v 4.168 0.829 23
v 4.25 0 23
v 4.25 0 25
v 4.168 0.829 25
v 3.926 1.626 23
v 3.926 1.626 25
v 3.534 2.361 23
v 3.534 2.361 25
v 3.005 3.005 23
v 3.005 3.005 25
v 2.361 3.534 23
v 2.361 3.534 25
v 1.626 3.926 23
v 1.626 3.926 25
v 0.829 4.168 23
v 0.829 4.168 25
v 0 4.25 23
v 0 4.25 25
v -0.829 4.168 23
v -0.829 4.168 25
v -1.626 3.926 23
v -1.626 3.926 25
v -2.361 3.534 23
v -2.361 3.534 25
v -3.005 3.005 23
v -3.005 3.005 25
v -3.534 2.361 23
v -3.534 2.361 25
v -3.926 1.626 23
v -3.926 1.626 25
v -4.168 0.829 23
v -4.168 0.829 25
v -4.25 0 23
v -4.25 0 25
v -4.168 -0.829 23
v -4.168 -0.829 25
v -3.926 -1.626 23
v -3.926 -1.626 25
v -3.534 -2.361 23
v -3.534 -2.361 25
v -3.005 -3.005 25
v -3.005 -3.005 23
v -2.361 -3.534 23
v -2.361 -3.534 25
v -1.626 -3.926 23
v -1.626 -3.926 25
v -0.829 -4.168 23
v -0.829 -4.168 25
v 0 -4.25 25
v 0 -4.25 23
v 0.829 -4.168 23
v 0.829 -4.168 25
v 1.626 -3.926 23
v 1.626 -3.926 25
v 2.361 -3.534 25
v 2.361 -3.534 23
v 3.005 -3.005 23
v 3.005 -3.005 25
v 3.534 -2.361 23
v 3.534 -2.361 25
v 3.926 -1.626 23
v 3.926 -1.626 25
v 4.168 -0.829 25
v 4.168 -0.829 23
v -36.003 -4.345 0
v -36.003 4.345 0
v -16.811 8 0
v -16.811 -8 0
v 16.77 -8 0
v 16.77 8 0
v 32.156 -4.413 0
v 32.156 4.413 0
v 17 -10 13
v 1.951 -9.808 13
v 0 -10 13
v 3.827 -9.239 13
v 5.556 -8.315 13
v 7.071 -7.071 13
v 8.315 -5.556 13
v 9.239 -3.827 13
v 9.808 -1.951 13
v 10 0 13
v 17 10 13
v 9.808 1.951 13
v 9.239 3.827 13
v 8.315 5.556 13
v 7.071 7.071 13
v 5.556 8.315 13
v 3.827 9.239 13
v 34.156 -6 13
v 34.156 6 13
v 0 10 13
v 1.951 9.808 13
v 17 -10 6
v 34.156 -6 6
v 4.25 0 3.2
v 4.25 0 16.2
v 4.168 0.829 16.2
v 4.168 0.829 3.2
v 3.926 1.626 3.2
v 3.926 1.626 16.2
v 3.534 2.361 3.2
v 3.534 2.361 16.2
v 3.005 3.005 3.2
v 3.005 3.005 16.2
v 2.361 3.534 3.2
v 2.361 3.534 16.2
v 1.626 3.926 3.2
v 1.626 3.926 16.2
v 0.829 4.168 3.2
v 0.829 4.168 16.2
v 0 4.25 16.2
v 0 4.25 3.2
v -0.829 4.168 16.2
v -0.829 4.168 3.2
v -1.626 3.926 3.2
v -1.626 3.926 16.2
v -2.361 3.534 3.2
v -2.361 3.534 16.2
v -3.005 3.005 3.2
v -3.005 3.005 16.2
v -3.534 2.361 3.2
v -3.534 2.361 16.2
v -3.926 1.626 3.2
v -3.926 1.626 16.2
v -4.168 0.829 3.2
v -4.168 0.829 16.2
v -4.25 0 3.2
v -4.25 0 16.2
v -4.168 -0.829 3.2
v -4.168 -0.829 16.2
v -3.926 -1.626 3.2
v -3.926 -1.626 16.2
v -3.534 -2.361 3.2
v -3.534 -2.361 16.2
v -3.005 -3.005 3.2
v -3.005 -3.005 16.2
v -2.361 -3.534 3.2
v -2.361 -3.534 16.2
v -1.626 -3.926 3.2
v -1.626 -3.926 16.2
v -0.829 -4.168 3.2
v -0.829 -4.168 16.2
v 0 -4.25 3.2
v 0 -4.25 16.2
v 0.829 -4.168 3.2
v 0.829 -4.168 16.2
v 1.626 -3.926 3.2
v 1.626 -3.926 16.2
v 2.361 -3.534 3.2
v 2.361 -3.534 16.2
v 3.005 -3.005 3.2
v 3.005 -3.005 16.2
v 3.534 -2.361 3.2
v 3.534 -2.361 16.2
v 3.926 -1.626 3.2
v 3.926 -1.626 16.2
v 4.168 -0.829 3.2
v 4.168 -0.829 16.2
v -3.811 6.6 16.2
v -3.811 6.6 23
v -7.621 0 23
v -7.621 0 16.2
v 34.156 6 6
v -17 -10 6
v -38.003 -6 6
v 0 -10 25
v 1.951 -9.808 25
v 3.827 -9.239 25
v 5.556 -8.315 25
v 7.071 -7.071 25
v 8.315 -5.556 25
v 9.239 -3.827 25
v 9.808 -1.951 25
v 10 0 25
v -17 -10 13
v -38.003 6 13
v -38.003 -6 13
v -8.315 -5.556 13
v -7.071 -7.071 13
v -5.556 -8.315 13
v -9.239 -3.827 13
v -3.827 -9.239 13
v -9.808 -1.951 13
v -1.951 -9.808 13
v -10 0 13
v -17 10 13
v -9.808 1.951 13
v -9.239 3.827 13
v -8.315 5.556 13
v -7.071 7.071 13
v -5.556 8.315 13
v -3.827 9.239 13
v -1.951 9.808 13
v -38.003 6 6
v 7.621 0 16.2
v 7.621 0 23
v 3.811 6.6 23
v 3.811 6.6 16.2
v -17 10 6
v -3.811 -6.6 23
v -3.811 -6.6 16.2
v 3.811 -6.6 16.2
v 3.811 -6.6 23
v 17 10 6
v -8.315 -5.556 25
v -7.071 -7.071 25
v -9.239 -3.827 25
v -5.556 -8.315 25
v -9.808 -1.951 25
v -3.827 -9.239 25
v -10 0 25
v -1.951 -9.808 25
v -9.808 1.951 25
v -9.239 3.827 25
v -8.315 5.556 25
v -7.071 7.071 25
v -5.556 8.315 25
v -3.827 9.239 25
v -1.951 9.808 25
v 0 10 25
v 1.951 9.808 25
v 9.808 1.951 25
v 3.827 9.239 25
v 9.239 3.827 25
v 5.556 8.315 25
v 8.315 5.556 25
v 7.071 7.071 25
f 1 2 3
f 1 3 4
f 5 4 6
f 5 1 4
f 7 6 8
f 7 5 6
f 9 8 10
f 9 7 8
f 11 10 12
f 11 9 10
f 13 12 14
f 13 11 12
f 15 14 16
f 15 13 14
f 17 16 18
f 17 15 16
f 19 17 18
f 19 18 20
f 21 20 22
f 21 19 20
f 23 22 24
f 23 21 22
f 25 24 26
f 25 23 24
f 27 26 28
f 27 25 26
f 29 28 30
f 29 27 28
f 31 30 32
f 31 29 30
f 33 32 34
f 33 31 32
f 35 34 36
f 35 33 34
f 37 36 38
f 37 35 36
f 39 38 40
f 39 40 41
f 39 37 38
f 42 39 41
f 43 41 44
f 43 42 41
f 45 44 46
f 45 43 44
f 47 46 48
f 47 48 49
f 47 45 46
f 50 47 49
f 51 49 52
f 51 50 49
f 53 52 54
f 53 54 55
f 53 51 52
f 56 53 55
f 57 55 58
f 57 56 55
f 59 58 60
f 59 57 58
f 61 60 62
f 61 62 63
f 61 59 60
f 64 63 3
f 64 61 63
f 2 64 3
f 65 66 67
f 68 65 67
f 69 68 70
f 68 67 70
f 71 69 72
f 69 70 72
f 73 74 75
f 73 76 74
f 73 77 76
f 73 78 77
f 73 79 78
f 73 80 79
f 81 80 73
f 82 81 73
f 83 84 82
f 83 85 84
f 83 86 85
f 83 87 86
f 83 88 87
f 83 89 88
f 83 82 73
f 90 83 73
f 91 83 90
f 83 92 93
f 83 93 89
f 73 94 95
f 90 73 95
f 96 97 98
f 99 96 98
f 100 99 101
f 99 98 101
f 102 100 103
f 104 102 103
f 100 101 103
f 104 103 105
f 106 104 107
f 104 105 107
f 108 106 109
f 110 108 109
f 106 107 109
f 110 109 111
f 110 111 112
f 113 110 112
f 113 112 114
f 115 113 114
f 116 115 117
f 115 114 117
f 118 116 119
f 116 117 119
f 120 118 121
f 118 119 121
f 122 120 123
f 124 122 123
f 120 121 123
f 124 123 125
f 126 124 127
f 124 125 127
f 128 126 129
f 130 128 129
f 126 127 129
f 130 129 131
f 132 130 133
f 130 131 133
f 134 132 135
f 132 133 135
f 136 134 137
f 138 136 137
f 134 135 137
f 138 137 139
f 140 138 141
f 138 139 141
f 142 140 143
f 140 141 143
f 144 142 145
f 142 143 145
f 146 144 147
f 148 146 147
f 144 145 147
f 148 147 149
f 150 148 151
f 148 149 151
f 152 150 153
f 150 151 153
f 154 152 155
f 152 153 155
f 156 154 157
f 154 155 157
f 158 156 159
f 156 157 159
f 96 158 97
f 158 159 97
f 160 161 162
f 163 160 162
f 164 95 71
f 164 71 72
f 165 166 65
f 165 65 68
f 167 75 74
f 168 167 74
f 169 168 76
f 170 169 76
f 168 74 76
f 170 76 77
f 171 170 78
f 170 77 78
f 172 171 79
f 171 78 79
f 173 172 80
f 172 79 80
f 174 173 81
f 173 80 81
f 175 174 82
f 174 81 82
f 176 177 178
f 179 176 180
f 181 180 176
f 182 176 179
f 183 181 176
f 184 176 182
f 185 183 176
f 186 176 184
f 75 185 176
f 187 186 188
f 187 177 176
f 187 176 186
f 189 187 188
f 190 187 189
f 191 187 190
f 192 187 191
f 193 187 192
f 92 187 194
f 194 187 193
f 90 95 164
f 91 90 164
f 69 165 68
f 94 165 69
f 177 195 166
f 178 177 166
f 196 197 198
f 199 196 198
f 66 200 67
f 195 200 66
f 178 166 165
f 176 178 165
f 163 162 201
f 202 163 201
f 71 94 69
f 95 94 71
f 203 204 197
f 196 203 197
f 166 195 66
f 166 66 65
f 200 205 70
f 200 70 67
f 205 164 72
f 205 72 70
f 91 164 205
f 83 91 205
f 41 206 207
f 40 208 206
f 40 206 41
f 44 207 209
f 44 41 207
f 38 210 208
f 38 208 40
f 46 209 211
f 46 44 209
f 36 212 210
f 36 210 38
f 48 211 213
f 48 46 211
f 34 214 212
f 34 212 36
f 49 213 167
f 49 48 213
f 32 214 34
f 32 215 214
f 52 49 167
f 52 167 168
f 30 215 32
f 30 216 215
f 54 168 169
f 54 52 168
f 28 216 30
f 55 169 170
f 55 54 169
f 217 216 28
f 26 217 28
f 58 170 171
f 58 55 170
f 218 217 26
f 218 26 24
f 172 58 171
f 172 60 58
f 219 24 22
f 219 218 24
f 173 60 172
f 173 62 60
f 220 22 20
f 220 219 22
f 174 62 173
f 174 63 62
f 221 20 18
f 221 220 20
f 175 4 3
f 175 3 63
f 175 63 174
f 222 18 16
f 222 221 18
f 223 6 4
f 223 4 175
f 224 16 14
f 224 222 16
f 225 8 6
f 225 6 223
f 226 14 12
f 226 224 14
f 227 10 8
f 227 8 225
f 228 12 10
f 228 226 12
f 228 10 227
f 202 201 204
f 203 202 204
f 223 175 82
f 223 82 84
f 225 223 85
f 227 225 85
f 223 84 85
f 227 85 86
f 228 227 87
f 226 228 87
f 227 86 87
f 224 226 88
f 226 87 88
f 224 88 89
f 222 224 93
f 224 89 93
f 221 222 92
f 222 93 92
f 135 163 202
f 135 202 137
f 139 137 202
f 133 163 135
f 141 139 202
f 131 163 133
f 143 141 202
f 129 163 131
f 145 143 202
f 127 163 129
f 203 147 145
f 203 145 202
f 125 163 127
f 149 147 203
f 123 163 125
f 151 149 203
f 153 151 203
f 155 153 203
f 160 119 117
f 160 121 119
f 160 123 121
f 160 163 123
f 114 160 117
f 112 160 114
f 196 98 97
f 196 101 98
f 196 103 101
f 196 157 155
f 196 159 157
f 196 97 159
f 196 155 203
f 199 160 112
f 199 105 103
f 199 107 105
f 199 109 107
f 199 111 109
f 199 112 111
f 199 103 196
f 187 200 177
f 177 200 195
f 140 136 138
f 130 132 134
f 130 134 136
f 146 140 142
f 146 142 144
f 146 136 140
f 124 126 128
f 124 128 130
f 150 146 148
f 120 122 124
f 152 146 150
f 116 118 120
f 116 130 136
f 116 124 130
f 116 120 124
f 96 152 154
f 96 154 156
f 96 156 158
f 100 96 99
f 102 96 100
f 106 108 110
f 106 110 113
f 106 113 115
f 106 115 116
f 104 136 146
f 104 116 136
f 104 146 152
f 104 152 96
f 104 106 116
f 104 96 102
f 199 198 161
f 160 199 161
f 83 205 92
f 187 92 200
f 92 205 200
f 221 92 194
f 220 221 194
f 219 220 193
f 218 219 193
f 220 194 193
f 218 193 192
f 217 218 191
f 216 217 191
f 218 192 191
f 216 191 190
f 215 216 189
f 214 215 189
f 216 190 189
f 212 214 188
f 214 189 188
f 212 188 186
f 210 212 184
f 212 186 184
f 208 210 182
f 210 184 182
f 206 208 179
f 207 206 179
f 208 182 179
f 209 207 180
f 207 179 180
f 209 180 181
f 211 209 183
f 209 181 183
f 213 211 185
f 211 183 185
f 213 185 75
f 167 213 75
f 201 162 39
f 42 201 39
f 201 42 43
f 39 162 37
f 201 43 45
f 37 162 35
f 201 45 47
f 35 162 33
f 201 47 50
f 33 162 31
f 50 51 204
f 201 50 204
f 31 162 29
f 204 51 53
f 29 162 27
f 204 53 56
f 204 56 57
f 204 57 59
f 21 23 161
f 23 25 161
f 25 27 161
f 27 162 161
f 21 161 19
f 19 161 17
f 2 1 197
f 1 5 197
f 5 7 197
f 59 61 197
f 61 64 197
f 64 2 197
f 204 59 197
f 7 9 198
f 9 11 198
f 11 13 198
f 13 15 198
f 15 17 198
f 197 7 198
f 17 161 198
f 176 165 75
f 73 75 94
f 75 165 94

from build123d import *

# Parameters (mm, degrees)
F1_DEPTH  = 13
F3_DEPTH  = 12
F5_DEPTH  = 8.8
F6_R      = 4.25
F7_DEPTH  = 13
F9_R      = 10
F9_R_2    = 4.25
F10_DEPTH = 2
F11_SIZE2 = 6
F11_SIZE  = 2


with BuildPart() as f1:
    # F0 (on Top) → F1 (new body)
    with BuildSketch(Plane.XY):
        Polygon((-17, -10), (17, -10), (34.1558913715, -6), (34.1558913715, 6), (17, 10), (-17, 10), (-38.0029598341, 6), (-38.0029598341, -6), align=None)
    extrude(amount=F1_DEPTH)

    # F2 (on face) → F3 (join)
    with BuildSketch(Plane.XY.offset(13)):
        with BuildLine():
            ThreePointArc((0, -10), (7.0710678119, -7.0710678119), (10, 0))
            ThreePointArc((10, 0), (7.0710677987, 7.0710678251), (-3.73e-08, 10))
            ThreePointArc((-3.73e-08, 10), (-10, -1.87e-08), (0, -10))
        make_face()
    extrude(amount=F3_DEPTH)

    # F4 (on face) → F5 (cut)
    with BuildSketch(Plane.XY.offset(25)):
        Polygon((-3.8105117767, -6.6), (3.8105117767, -6.6), (7.6210235533, 0), (3.8105117767, 6.6), (-3.8105117767, 6.6), (-7.6210235533, 0), align=None)
    extrude(amount=-F5_DEPTH, mode=Mode.SUBTRACT)

    # F6 (on face) → F7 (cut)
    with BuildSketch(Plane.XY.offset(16.2)):
        Circle(F6_R)
    extrude(amount=-F7_DEPTH, mode=Mode.SUBTRACT)

    # F9 (on offset) → F10 (join)
    with BuildSketch(Plane.XY.offset(23)):
        Circle(F9_R)
        Circle(F9_R_2, mode=Mode.SUBTRACT)
    extrude(amount=F10_DEPTH)

    # F11
    f11_edges = [f1.edges().sort_by_distance(p)[0] for p in [
        (0, -10, 0),
        (-27.50148, -8, 0),
        (-38.00296, 0, 0),
        (25.577946, -8, 0),
        (34.155891, 0, 0),
        (25.577946, 8, 0),
        (0, 10, 0),
        (-27.50148, 8, 0),
    ]]
    f11_side = f1.faces().sort_by_distance((-1.644994, 0, 0))[0]
    chamfer(f11_edges, length=F11_SIZE, length2=F11_SIZE2, reference=f11_side)


solid = f1.part
